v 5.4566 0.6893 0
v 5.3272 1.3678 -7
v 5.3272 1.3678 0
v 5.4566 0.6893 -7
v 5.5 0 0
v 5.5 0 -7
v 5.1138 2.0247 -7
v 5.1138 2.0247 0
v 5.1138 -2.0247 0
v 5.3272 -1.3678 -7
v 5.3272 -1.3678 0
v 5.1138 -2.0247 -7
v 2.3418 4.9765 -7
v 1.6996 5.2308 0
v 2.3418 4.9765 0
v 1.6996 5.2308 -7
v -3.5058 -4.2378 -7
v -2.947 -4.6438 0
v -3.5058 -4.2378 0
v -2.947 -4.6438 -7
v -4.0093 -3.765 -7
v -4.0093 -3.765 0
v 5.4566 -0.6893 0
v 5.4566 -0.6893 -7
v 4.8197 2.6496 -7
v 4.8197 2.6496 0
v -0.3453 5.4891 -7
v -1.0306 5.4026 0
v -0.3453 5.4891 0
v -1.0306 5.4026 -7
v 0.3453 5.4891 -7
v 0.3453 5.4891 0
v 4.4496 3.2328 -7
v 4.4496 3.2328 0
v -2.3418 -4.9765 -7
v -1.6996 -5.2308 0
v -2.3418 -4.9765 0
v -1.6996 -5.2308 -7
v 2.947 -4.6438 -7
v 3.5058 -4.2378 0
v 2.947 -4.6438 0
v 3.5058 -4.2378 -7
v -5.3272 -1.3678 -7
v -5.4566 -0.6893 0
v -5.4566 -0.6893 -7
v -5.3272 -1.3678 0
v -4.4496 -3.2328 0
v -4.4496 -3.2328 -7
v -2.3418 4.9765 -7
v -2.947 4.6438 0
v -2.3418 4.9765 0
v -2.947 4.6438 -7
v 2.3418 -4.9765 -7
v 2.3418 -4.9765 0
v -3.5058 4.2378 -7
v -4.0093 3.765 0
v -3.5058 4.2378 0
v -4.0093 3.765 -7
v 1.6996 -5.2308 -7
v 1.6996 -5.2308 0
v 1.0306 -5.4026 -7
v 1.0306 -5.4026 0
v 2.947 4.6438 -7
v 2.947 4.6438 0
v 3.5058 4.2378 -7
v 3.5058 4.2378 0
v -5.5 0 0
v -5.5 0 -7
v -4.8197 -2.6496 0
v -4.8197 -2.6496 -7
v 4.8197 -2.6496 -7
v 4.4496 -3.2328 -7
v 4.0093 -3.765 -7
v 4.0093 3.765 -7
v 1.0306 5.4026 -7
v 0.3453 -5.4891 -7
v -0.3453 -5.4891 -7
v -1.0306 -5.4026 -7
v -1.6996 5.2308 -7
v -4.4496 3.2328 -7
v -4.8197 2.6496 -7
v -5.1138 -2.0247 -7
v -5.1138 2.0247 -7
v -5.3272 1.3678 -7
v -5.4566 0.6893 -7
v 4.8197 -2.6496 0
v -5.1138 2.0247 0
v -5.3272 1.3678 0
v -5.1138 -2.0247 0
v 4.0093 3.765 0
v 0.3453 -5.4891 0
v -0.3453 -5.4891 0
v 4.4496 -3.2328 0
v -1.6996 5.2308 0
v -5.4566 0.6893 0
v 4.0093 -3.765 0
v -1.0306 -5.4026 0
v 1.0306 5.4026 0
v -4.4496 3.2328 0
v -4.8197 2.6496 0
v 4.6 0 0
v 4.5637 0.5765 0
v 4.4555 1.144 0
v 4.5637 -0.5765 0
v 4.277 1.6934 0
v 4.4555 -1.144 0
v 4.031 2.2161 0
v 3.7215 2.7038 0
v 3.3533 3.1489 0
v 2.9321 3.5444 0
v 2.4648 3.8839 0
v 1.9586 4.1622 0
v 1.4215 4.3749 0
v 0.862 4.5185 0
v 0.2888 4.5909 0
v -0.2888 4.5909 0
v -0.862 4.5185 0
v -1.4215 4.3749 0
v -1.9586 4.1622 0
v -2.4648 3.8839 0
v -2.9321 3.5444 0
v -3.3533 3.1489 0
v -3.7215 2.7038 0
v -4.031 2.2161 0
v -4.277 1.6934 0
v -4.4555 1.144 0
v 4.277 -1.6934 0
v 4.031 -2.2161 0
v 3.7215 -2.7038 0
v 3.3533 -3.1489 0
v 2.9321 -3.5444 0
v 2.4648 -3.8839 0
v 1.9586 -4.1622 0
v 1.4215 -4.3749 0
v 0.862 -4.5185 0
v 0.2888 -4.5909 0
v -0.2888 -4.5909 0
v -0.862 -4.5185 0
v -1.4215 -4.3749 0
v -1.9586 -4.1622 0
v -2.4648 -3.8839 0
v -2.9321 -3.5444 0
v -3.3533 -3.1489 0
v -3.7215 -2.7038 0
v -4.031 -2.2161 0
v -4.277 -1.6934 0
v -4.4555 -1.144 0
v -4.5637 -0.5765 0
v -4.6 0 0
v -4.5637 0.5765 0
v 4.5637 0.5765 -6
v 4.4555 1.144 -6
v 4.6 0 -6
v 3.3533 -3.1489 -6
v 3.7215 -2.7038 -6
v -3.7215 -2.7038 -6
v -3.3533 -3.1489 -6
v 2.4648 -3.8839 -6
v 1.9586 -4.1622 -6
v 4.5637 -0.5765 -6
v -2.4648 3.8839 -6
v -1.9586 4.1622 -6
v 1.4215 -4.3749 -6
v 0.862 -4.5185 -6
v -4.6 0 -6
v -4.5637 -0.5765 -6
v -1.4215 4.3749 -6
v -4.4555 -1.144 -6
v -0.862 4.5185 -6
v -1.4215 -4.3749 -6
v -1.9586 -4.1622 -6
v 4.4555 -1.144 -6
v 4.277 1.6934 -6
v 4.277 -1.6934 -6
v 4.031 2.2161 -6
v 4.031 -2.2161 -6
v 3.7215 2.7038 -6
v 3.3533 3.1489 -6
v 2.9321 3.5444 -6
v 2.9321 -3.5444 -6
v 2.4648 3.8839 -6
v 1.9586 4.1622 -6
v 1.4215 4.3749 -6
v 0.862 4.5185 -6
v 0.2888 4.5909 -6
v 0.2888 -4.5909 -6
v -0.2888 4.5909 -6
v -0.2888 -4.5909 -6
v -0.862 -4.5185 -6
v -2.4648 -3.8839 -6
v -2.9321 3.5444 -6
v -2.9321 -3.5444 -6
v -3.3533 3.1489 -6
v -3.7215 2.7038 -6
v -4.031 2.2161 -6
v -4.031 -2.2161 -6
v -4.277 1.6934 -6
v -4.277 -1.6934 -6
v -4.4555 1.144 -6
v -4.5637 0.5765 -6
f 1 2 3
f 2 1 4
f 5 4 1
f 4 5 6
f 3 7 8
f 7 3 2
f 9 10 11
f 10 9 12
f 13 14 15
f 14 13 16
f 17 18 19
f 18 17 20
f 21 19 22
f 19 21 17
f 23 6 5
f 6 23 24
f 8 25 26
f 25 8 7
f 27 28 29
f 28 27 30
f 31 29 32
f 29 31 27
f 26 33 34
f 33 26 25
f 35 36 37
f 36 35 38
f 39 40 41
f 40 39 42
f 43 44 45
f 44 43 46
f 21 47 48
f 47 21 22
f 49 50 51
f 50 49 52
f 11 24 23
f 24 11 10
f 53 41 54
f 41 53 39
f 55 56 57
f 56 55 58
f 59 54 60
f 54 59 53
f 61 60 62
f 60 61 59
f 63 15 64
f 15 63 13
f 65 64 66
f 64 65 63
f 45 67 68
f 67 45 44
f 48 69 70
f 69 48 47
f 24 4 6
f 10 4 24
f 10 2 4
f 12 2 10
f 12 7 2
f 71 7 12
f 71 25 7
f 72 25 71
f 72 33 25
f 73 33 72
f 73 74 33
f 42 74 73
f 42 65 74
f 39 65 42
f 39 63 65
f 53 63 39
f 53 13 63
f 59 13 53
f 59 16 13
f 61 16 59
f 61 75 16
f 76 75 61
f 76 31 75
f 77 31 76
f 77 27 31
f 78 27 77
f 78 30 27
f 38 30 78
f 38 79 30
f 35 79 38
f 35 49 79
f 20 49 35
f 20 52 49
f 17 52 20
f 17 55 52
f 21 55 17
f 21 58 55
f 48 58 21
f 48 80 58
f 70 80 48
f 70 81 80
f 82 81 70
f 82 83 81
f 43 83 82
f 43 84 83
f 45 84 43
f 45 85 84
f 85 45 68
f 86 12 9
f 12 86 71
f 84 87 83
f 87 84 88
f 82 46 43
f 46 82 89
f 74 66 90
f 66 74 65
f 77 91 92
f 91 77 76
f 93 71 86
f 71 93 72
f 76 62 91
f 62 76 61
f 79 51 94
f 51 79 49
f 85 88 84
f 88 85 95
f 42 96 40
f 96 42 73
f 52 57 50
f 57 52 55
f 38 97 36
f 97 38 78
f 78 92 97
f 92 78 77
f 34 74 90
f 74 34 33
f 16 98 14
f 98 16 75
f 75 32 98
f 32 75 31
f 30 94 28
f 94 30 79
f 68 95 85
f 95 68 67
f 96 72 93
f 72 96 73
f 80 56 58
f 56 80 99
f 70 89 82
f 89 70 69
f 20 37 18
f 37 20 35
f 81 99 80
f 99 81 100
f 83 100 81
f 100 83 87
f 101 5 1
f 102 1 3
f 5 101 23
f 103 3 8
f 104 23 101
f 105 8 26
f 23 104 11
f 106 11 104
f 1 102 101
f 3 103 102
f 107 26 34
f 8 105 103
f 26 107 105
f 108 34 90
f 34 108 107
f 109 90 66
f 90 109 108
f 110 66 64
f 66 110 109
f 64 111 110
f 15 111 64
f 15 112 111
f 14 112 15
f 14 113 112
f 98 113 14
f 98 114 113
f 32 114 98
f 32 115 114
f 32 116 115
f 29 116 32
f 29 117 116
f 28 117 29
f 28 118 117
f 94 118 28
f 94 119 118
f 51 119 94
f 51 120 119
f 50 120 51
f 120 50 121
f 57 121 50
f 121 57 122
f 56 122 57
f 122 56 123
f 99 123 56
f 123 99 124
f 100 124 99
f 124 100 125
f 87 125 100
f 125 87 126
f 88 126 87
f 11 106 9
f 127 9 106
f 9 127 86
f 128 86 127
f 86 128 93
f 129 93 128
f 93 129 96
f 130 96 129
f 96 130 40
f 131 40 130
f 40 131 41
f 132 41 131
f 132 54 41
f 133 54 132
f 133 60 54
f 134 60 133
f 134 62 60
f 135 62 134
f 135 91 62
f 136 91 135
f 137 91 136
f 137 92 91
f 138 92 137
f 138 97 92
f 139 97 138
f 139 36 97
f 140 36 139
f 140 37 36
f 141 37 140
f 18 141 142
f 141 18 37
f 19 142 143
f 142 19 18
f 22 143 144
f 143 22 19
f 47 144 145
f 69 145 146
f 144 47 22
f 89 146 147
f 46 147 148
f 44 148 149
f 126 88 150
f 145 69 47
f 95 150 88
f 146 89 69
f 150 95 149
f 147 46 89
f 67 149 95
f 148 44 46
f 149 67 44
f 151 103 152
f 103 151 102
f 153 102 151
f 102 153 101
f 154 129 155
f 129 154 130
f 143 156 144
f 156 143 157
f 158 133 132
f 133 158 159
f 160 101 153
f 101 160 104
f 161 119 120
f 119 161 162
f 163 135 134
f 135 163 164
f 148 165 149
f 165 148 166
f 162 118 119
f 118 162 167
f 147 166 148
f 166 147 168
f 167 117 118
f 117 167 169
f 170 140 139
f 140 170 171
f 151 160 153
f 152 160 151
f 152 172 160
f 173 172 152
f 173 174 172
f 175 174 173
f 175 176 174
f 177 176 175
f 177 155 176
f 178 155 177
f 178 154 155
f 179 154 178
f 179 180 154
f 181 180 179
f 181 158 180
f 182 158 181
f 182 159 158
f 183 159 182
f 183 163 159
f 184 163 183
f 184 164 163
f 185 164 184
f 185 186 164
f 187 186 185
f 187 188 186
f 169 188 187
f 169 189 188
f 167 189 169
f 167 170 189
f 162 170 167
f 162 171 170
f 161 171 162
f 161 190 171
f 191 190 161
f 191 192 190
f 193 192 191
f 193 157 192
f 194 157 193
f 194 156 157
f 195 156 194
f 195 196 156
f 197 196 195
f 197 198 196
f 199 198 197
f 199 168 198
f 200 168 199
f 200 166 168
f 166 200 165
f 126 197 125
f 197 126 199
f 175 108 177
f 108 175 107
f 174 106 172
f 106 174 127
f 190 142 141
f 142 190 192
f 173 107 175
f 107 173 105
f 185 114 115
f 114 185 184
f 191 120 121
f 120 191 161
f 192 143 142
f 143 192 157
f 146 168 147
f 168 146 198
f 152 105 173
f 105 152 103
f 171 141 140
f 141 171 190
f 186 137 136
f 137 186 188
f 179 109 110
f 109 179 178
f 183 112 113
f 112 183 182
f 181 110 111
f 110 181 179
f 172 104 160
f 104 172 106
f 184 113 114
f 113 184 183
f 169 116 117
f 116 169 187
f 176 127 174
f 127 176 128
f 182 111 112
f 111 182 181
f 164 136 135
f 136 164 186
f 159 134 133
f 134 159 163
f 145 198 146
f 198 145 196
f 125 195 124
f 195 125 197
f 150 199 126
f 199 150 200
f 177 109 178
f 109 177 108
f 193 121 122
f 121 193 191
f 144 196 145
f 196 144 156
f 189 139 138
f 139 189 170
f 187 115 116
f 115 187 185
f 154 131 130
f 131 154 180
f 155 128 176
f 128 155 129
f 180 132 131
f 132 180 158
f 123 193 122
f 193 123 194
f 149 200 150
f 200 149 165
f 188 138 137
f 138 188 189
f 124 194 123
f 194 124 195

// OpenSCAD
$fn = 50;


difference() {
	union() {
		translate(v = [0, 0, -7.0000000000]) {
			cylinder(h = 7, r = 5.5000000000);
		}
	}
	union() {
		#translate(v = [0, 0, -6.0000000000]) {
			cylinder(h = 6, r = 4.6000000000);
		}
	}
}
